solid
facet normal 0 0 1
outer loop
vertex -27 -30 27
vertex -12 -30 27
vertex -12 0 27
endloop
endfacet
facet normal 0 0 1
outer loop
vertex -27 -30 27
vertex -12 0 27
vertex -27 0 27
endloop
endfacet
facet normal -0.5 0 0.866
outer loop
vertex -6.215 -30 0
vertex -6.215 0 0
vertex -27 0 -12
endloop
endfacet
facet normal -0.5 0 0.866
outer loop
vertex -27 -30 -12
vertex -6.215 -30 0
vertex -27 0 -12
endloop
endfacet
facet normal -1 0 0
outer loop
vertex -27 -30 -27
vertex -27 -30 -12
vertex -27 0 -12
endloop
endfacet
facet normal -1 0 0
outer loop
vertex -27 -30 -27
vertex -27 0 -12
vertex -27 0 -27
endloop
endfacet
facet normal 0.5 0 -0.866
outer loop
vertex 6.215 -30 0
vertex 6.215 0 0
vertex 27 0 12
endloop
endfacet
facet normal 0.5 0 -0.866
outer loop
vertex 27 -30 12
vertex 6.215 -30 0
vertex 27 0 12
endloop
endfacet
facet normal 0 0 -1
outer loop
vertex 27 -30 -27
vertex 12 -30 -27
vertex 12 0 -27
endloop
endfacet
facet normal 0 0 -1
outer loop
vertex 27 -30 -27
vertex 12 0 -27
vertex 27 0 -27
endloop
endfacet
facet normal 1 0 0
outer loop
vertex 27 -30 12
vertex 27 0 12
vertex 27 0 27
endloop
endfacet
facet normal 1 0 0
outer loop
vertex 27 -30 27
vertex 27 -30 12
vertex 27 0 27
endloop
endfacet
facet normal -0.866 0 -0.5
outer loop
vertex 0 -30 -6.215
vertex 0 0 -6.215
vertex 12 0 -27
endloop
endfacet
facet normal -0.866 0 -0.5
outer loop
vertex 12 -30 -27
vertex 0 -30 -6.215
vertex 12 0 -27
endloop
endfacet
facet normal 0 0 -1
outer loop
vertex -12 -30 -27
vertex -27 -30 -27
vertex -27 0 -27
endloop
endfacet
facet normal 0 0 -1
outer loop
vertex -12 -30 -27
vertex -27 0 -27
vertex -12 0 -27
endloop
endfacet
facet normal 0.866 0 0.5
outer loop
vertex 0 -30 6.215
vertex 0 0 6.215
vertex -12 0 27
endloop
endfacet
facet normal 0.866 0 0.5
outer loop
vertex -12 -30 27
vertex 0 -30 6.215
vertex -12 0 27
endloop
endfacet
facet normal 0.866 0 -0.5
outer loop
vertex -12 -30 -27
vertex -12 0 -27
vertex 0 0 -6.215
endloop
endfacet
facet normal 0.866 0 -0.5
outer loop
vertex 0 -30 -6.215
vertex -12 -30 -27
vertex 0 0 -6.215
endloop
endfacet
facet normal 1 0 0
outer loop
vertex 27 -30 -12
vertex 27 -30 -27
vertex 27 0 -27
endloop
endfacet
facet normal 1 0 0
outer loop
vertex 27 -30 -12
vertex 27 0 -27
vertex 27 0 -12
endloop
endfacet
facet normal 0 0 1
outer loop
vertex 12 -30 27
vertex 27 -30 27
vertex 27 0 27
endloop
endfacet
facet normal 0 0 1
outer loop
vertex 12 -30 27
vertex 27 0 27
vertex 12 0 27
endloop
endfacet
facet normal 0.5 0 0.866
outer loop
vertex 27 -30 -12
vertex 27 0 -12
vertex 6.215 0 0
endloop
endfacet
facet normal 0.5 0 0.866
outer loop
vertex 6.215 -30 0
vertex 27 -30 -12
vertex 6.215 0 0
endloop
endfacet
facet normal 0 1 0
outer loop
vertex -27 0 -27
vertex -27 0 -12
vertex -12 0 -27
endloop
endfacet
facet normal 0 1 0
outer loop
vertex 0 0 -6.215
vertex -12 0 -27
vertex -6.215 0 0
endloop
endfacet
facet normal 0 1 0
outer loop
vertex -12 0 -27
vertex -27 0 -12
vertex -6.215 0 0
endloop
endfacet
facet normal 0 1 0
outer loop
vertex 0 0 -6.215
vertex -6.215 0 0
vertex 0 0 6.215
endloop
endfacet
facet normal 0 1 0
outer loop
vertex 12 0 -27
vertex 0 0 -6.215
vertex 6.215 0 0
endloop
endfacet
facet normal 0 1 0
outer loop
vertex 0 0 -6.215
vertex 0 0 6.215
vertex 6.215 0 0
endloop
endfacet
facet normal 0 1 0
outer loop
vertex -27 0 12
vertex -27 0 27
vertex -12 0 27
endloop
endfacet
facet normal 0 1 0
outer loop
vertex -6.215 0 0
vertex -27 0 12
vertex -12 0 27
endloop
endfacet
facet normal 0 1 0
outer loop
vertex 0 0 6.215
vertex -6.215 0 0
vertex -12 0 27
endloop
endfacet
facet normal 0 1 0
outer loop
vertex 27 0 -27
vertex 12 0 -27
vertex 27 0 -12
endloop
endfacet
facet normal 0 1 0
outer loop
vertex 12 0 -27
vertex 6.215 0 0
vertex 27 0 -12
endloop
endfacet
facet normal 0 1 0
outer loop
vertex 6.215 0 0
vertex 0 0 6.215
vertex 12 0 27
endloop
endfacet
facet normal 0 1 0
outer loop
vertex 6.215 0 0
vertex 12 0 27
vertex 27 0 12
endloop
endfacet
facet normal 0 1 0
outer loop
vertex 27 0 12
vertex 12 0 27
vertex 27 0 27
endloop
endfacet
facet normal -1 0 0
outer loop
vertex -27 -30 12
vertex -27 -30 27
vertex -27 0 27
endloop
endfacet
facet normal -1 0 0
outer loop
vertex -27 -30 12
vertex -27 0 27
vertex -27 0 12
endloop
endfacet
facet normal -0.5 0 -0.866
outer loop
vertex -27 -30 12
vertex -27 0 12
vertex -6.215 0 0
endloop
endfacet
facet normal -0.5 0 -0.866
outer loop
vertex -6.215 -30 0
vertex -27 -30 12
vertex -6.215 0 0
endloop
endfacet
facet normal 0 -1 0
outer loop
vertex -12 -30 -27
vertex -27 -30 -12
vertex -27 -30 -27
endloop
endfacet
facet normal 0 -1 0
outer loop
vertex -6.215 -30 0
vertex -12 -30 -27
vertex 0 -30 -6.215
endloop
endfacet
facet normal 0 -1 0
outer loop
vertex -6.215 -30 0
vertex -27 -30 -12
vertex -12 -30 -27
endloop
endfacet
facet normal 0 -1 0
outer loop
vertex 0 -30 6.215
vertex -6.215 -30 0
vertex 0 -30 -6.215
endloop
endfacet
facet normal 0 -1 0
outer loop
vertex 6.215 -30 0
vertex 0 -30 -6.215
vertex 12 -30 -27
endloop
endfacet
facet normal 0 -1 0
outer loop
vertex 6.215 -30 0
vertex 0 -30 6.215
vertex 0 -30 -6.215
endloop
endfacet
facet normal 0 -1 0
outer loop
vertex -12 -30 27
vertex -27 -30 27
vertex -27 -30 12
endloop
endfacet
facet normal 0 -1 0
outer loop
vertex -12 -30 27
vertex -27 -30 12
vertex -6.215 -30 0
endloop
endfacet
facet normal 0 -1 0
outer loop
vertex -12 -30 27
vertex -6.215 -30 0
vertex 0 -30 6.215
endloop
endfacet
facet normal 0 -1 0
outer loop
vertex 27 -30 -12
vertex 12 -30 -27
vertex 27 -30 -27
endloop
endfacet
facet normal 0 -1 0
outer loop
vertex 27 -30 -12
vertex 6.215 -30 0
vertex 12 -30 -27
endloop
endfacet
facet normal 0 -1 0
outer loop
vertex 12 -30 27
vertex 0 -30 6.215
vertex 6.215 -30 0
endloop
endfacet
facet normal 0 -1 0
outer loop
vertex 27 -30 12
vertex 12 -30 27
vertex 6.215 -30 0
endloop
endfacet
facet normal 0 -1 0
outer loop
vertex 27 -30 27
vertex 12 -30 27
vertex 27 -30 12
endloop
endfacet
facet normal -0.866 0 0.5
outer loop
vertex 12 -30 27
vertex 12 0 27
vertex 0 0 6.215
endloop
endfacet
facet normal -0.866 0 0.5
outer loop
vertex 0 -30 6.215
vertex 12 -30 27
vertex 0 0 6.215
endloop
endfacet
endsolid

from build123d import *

# Parameters (mm, degrees)
F1_DEPTH = 30


with BuildPart() as f1:
    # F0 (on Front) → F1 (new body)
    with BuildSketch(Plane.XZ):
        Polygon((12, 27), (0, 6.21539), (-12, 27), (-27, 27), (-27, 12), (-6.21539, 0), (-27, -12), (-27, -27), (-12, -27), (0, -6.21539), (12, -27), (27, -27), (27.000002, -12), (6.215392, -1e-06), (27.000001, 12), (27, 27), align=None)
    extrude(amount=F1_DEPTH)


solid = f1.part
